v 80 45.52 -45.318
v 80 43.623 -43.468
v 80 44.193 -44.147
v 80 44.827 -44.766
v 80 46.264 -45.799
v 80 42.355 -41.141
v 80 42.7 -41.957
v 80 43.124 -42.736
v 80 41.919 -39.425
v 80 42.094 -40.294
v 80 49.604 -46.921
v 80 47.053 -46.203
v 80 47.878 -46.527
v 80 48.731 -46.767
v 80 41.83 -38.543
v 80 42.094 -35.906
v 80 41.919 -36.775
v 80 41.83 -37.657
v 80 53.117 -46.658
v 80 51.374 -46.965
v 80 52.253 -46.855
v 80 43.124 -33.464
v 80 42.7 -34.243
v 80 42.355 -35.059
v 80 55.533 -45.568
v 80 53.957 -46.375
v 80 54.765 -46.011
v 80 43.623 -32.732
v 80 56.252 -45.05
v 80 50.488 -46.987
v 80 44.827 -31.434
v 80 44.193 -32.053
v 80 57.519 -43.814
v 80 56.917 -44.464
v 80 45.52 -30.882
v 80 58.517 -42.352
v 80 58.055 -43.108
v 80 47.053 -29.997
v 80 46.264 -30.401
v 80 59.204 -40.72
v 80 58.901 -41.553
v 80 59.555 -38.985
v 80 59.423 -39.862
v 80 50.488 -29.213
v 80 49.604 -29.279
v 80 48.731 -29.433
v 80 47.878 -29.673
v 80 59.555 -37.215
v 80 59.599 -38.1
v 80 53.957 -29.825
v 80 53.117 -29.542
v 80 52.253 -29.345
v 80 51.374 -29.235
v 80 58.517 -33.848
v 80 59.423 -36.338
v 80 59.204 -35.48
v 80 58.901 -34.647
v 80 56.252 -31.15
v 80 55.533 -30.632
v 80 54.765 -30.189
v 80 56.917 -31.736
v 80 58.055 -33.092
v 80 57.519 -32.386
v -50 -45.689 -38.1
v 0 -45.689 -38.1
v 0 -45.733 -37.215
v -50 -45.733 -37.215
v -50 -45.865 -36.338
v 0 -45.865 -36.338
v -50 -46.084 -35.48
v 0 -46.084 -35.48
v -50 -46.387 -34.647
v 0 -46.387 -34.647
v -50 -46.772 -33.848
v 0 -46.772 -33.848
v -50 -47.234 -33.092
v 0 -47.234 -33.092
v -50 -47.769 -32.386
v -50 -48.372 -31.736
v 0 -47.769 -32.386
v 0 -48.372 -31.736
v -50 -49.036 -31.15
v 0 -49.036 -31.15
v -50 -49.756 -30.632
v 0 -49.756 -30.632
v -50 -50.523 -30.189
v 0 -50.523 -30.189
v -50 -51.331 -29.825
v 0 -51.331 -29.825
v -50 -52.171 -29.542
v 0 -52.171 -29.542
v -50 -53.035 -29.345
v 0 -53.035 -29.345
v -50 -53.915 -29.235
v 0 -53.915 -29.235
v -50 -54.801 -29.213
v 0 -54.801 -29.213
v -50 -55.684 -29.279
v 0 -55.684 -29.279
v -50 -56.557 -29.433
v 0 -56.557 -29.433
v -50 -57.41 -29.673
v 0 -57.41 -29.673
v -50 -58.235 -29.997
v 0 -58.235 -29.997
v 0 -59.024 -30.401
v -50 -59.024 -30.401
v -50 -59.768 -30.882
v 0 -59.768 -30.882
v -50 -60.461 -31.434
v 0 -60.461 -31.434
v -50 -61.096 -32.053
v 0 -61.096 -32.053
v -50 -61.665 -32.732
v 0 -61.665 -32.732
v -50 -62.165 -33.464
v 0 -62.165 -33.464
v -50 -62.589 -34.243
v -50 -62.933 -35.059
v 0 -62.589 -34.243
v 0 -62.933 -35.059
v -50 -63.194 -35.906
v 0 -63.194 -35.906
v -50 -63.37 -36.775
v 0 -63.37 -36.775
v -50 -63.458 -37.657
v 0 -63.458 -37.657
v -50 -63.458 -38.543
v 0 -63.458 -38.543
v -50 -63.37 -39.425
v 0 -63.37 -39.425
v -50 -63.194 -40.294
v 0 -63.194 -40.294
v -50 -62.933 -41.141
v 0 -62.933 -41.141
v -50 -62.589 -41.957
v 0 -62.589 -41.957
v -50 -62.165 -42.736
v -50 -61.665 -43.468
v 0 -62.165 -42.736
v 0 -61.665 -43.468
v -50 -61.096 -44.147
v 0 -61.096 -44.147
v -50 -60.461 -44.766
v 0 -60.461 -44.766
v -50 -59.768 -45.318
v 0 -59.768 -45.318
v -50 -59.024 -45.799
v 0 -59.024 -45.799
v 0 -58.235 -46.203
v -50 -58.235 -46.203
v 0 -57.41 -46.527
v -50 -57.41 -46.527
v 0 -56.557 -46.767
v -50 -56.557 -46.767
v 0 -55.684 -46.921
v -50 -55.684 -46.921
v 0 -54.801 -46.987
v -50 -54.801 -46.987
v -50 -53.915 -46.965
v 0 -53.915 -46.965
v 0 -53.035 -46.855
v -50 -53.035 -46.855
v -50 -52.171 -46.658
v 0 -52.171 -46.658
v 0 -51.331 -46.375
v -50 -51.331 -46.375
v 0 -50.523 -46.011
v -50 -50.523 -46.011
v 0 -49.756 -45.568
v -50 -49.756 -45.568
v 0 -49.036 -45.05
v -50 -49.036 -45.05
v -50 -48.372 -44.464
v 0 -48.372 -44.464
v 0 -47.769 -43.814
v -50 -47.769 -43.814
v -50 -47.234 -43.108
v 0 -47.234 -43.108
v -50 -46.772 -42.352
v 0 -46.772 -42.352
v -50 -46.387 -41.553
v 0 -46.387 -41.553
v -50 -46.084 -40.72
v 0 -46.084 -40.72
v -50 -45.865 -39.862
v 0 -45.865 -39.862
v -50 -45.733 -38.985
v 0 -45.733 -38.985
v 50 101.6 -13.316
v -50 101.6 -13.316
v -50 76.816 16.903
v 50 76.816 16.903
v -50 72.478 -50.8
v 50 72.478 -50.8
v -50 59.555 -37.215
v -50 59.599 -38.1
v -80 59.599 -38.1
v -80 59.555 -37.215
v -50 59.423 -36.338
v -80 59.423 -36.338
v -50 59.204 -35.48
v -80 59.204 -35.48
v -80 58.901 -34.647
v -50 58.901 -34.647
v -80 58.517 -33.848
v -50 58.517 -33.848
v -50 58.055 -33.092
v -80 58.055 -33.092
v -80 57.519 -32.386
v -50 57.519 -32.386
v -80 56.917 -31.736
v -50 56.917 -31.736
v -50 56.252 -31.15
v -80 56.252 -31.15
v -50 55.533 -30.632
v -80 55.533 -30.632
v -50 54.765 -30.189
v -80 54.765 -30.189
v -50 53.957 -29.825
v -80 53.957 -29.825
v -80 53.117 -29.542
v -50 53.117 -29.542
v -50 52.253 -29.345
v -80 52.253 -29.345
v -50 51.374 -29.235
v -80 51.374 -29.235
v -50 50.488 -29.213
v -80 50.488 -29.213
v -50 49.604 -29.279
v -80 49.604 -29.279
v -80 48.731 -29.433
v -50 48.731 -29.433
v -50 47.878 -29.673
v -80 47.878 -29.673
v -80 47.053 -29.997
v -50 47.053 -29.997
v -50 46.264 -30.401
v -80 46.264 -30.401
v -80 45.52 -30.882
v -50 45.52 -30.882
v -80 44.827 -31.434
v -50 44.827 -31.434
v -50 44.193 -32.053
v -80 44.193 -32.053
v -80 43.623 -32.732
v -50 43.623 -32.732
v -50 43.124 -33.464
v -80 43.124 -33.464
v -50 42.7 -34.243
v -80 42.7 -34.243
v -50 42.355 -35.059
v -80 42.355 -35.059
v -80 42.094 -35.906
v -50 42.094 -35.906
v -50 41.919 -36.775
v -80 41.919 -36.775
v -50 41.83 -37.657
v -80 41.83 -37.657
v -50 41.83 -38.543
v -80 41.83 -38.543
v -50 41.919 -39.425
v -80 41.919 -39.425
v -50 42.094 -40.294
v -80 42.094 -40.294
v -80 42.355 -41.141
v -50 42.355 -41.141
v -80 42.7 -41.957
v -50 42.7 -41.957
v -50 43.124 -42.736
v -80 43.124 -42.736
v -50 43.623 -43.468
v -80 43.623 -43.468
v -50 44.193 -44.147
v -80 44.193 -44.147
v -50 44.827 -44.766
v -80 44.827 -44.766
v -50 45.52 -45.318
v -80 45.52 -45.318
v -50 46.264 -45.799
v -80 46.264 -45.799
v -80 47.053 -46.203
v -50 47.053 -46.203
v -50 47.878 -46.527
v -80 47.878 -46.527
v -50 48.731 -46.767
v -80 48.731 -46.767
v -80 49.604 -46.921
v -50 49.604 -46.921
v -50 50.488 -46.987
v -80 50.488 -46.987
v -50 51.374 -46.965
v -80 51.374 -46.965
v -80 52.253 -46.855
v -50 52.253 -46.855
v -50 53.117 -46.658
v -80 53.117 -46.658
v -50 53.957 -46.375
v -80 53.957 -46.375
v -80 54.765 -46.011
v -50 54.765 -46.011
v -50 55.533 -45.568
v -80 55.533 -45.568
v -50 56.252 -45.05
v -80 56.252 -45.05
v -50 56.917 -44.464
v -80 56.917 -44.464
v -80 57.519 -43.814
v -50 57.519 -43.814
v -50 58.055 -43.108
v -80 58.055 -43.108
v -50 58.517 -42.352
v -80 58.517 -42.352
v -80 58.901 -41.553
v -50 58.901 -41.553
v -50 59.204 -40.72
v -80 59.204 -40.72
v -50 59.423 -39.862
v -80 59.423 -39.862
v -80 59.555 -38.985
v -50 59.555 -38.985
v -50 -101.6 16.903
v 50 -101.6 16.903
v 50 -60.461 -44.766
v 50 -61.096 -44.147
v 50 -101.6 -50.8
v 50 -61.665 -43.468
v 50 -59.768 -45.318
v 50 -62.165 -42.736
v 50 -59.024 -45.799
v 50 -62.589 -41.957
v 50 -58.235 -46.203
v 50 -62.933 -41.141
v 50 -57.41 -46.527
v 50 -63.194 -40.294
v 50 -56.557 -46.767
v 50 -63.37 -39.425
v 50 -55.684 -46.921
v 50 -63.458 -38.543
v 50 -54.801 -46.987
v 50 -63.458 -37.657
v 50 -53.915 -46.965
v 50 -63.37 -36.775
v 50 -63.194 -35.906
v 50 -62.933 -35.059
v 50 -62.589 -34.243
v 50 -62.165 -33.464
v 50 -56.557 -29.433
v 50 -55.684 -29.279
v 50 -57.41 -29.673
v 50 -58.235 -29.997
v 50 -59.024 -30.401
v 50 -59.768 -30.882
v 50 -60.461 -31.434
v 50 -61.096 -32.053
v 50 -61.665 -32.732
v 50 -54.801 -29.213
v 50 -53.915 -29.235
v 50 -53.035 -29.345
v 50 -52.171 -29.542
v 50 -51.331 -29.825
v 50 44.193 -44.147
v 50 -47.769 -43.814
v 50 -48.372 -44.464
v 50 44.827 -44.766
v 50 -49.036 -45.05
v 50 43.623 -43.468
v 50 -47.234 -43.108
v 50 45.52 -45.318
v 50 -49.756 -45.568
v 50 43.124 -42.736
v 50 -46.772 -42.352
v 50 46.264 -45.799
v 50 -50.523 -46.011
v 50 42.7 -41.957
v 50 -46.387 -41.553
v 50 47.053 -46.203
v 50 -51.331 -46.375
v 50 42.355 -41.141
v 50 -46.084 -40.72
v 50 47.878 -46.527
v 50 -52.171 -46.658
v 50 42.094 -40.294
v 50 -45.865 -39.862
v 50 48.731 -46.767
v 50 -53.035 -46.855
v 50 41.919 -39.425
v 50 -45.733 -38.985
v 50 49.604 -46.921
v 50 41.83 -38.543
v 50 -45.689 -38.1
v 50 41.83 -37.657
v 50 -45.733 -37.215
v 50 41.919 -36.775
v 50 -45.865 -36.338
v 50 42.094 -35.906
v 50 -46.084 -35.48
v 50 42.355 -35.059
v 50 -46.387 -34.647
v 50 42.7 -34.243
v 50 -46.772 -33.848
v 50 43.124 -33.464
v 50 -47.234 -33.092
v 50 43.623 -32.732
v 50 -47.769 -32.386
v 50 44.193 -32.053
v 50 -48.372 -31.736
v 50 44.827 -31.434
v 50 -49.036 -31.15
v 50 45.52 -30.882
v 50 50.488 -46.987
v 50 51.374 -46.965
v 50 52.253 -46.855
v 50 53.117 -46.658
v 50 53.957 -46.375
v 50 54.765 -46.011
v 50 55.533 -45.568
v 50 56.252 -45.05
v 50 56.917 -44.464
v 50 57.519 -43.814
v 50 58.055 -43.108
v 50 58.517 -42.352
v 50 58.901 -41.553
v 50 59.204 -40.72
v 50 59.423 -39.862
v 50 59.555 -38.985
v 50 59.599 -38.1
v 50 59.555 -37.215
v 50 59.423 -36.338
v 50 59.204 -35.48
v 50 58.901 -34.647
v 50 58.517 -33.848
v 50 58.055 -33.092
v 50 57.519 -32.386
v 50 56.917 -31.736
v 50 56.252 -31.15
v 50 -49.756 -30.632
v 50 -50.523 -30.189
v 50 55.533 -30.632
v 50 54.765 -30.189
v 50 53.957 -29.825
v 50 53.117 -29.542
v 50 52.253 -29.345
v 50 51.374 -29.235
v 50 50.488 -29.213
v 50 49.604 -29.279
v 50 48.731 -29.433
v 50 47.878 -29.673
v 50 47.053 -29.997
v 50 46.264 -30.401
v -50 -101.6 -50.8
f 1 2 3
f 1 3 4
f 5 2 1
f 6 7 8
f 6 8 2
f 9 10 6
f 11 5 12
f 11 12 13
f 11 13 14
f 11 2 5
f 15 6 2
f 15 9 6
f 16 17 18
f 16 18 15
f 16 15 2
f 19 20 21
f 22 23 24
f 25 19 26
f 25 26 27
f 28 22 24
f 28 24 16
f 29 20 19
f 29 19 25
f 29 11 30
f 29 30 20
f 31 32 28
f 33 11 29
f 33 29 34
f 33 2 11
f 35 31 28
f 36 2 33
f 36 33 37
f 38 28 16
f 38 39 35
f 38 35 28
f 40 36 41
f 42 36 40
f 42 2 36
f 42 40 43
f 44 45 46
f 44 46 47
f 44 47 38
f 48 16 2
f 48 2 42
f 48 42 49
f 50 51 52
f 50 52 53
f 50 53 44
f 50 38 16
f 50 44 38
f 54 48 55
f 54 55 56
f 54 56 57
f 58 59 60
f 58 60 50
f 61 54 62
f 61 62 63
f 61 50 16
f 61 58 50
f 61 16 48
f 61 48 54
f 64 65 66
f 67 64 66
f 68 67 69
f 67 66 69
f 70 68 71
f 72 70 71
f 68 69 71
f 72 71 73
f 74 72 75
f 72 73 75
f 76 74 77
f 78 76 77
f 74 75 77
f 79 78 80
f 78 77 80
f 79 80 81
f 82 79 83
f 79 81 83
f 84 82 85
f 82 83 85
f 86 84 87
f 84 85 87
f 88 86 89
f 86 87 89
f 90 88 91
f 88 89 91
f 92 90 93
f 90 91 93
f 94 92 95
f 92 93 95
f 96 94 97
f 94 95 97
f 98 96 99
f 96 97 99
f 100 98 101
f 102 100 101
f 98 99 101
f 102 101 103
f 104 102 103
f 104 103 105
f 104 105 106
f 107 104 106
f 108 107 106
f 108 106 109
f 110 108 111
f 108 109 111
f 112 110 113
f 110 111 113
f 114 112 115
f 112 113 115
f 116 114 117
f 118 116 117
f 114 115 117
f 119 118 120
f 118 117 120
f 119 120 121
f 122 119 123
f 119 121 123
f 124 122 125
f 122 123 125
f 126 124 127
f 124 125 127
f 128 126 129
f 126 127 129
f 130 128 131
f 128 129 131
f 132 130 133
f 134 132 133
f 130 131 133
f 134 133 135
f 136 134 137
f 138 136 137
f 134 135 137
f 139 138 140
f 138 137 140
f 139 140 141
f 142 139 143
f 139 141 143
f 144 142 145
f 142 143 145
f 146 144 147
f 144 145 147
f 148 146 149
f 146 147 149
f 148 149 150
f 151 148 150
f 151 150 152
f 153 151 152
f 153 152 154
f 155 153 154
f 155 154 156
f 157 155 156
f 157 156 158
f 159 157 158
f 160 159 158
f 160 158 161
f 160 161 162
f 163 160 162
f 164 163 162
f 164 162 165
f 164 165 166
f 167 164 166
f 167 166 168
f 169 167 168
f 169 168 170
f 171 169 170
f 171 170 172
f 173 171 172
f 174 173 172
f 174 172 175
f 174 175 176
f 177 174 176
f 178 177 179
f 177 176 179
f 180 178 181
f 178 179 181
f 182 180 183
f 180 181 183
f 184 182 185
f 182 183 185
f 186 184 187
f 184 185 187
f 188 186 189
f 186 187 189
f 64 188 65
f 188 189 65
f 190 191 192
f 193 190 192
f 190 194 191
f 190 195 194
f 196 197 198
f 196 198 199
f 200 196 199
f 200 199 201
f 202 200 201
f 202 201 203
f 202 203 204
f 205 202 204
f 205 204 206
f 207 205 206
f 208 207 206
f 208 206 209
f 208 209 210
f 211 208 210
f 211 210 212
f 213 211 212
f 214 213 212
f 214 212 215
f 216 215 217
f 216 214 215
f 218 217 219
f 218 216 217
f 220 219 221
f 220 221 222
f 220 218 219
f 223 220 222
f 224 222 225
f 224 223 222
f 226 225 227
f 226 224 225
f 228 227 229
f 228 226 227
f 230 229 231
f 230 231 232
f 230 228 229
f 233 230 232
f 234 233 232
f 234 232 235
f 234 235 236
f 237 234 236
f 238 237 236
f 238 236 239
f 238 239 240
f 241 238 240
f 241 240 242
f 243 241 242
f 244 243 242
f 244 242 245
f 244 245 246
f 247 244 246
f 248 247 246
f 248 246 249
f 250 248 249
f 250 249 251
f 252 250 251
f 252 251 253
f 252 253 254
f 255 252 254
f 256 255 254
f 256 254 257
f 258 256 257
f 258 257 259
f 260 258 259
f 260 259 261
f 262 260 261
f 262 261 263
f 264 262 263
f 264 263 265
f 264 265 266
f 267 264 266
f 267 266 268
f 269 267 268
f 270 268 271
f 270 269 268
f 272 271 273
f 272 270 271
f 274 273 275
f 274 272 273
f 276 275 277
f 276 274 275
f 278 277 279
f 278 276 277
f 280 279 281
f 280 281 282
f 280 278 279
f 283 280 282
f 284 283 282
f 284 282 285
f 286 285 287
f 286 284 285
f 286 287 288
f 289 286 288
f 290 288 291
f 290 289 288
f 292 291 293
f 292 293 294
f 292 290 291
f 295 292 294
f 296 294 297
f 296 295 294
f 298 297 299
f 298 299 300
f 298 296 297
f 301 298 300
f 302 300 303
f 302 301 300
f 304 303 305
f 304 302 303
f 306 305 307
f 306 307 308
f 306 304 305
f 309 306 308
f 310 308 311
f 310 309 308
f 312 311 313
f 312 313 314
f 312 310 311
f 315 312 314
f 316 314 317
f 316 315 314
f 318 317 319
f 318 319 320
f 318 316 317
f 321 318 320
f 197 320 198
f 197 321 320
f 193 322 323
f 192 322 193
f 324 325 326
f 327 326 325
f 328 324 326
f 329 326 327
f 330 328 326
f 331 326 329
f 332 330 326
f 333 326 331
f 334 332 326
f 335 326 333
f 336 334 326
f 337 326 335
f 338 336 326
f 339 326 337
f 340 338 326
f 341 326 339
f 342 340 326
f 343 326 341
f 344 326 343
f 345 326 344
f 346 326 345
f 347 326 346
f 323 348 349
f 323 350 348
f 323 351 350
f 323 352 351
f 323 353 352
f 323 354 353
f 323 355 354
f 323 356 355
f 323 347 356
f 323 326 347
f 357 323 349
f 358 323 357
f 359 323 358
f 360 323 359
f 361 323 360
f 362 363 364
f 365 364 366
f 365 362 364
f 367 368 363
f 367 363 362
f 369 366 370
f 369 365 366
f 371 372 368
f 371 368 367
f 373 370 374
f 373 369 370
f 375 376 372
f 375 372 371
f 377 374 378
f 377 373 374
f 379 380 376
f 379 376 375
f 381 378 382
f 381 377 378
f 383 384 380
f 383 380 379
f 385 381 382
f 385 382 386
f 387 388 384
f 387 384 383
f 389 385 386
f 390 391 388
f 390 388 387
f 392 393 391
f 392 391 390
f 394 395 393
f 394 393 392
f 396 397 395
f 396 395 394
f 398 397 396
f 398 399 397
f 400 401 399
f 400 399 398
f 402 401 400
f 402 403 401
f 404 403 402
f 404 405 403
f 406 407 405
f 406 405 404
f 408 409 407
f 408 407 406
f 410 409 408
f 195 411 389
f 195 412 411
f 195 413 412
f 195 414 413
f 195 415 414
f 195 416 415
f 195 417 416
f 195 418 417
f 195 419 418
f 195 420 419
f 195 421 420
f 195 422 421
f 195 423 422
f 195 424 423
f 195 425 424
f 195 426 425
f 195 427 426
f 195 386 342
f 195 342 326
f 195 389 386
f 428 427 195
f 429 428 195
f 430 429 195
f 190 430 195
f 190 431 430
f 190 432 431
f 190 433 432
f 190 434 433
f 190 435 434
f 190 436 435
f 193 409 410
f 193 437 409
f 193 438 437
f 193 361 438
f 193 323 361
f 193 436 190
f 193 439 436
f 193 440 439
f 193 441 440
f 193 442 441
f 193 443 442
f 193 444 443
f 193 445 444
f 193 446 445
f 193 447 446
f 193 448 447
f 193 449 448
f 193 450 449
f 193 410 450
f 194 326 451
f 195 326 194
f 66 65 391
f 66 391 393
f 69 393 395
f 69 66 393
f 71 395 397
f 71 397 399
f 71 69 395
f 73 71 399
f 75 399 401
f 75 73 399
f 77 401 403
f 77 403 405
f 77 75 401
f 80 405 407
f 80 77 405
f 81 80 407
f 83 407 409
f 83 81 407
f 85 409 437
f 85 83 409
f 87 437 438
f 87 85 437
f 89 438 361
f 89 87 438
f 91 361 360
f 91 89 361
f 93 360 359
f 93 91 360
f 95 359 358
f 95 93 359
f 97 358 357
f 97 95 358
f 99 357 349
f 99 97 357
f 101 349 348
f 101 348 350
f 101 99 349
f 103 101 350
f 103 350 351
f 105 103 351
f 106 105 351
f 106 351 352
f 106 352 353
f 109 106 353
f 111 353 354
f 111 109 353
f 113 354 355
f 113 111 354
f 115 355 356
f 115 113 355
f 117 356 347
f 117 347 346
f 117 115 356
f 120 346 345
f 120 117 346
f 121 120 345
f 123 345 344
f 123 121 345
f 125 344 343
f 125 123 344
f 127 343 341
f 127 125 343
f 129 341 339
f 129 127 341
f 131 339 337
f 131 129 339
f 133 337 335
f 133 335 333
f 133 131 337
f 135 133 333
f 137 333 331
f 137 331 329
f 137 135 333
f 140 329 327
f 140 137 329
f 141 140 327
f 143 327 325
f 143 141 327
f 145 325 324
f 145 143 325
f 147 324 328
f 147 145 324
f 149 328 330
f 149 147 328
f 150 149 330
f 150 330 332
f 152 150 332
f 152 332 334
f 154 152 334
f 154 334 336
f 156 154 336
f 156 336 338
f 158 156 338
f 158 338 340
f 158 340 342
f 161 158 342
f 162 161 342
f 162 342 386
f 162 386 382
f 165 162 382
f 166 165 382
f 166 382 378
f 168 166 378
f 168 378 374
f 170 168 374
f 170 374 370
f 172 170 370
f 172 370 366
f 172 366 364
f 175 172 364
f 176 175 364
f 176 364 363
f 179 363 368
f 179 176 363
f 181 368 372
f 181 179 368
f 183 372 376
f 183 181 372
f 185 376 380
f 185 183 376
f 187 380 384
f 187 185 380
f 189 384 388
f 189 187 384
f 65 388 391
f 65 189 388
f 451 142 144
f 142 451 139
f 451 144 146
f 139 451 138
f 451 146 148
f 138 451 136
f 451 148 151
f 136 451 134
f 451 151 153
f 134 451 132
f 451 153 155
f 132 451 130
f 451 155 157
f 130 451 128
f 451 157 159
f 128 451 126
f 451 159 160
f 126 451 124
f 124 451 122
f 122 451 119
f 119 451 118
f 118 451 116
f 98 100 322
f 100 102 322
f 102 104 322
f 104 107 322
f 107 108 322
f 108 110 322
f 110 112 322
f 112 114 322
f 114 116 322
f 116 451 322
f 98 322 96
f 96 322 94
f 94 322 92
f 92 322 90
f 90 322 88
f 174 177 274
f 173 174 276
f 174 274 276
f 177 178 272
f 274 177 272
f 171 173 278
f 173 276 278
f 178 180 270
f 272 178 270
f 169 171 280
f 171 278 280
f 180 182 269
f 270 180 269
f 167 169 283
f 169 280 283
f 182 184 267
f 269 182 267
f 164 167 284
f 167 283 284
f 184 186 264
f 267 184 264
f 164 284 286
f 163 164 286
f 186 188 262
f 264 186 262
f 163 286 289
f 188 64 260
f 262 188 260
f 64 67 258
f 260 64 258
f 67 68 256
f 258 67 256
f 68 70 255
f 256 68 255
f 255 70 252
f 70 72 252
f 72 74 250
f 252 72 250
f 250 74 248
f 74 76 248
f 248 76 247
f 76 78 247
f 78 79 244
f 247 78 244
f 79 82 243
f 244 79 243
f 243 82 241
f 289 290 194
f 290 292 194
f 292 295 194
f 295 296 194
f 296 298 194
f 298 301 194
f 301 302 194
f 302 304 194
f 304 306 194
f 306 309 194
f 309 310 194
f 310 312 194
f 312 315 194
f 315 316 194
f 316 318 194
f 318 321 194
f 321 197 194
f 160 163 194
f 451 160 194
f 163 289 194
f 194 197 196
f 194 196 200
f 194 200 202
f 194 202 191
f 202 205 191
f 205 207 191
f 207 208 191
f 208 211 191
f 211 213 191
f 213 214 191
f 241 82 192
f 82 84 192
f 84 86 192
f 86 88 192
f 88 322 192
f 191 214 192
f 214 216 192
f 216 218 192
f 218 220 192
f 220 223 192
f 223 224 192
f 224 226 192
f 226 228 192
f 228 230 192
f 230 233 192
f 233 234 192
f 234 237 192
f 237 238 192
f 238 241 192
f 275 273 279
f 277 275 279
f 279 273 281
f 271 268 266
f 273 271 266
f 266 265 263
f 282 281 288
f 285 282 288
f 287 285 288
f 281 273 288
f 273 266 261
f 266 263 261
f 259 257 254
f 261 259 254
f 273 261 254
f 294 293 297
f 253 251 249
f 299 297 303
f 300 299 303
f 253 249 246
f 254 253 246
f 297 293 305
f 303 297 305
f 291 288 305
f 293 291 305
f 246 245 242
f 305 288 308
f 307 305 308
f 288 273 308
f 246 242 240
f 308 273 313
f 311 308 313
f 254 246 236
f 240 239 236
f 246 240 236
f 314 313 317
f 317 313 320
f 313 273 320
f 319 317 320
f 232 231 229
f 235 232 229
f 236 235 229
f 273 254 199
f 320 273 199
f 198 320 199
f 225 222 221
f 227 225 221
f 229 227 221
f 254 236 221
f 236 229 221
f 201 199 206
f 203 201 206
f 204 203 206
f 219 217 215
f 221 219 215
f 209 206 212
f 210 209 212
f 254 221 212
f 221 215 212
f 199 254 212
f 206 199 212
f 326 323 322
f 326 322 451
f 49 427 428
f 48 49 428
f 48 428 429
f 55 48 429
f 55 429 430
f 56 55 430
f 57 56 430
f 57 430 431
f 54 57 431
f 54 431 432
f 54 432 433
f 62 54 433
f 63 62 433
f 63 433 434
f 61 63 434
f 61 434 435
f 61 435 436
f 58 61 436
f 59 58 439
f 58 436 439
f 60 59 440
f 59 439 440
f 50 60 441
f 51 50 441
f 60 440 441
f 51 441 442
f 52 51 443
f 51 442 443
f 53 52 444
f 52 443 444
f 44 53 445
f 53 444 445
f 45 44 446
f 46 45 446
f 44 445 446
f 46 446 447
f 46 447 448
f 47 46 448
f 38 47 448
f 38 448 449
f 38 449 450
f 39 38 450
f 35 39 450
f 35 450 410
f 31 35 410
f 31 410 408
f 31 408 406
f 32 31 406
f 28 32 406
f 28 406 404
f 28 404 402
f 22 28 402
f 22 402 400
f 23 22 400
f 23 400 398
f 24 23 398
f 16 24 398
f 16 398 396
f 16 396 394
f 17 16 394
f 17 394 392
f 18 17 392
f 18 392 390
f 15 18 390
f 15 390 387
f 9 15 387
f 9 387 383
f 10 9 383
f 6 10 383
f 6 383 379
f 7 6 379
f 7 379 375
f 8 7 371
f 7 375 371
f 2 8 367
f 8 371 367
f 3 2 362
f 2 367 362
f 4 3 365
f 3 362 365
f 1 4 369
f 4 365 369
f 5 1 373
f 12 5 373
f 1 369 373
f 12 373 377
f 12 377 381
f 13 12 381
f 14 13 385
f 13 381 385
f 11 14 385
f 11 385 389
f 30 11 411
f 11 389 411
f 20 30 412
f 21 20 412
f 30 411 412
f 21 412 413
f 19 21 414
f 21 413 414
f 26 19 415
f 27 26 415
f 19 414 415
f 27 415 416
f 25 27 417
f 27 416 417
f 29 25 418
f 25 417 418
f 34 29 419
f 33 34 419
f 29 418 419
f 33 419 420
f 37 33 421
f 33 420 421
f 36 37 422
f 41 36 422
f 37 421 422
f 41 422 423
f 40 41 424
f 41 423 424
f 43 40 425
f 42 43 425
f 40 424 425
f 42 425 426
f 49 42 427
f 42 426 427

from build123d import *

# Parameters (mm, degrees)
F0_R     = 8.89
F1_DEPTH = 50
F3_DEPTH = 50
F4_DEPTH = 80


with BuildPart() as f1:
    # F0 (on Right) → F1 (new body)
    with BuildSketch(Plane.YZ):
        Polygon((-101.6, -50.8), (72.478287, -50.8), (101.6, -13.316209), (49.016677, 50.8), (-101.6, 50.8), align=None)
        with Locations((-54.578975, -38.1)):
            Circle(F0_R, mode=Mode.SUBTRACT)
        with Locations((50.709363, -38.1)):
            Circle(F0_R, mode=Mode.SUBTRACT)
    extrude(amount=F1_DEPTH)

    # F2 (on face) → F3 (cut)
    with BuildSketch(Plane.YZ.offset(50)):
        Polygon((-101.6, 50.8), (-101.6, 16.903477), (76.816072, 16.903477), (49.016677, 50.8), align=None)
    extrude(amount=-F3_DEPTH, mode=Mode.SUBTRACT)

    # F0 (on Right) → F4 (join)
    with BuildSketch(Plane.YZ):
        with Locations((50.709363, -38.1)):
            Circle(F0_R)
    extrude(amount=F4_DEPTH)

    # F5: F1 across plane


with BuildPart() as f1_1:
    add(f1.part)
    add(f1.part.mirror(Plane.YZ))


solid = f1_1.part
